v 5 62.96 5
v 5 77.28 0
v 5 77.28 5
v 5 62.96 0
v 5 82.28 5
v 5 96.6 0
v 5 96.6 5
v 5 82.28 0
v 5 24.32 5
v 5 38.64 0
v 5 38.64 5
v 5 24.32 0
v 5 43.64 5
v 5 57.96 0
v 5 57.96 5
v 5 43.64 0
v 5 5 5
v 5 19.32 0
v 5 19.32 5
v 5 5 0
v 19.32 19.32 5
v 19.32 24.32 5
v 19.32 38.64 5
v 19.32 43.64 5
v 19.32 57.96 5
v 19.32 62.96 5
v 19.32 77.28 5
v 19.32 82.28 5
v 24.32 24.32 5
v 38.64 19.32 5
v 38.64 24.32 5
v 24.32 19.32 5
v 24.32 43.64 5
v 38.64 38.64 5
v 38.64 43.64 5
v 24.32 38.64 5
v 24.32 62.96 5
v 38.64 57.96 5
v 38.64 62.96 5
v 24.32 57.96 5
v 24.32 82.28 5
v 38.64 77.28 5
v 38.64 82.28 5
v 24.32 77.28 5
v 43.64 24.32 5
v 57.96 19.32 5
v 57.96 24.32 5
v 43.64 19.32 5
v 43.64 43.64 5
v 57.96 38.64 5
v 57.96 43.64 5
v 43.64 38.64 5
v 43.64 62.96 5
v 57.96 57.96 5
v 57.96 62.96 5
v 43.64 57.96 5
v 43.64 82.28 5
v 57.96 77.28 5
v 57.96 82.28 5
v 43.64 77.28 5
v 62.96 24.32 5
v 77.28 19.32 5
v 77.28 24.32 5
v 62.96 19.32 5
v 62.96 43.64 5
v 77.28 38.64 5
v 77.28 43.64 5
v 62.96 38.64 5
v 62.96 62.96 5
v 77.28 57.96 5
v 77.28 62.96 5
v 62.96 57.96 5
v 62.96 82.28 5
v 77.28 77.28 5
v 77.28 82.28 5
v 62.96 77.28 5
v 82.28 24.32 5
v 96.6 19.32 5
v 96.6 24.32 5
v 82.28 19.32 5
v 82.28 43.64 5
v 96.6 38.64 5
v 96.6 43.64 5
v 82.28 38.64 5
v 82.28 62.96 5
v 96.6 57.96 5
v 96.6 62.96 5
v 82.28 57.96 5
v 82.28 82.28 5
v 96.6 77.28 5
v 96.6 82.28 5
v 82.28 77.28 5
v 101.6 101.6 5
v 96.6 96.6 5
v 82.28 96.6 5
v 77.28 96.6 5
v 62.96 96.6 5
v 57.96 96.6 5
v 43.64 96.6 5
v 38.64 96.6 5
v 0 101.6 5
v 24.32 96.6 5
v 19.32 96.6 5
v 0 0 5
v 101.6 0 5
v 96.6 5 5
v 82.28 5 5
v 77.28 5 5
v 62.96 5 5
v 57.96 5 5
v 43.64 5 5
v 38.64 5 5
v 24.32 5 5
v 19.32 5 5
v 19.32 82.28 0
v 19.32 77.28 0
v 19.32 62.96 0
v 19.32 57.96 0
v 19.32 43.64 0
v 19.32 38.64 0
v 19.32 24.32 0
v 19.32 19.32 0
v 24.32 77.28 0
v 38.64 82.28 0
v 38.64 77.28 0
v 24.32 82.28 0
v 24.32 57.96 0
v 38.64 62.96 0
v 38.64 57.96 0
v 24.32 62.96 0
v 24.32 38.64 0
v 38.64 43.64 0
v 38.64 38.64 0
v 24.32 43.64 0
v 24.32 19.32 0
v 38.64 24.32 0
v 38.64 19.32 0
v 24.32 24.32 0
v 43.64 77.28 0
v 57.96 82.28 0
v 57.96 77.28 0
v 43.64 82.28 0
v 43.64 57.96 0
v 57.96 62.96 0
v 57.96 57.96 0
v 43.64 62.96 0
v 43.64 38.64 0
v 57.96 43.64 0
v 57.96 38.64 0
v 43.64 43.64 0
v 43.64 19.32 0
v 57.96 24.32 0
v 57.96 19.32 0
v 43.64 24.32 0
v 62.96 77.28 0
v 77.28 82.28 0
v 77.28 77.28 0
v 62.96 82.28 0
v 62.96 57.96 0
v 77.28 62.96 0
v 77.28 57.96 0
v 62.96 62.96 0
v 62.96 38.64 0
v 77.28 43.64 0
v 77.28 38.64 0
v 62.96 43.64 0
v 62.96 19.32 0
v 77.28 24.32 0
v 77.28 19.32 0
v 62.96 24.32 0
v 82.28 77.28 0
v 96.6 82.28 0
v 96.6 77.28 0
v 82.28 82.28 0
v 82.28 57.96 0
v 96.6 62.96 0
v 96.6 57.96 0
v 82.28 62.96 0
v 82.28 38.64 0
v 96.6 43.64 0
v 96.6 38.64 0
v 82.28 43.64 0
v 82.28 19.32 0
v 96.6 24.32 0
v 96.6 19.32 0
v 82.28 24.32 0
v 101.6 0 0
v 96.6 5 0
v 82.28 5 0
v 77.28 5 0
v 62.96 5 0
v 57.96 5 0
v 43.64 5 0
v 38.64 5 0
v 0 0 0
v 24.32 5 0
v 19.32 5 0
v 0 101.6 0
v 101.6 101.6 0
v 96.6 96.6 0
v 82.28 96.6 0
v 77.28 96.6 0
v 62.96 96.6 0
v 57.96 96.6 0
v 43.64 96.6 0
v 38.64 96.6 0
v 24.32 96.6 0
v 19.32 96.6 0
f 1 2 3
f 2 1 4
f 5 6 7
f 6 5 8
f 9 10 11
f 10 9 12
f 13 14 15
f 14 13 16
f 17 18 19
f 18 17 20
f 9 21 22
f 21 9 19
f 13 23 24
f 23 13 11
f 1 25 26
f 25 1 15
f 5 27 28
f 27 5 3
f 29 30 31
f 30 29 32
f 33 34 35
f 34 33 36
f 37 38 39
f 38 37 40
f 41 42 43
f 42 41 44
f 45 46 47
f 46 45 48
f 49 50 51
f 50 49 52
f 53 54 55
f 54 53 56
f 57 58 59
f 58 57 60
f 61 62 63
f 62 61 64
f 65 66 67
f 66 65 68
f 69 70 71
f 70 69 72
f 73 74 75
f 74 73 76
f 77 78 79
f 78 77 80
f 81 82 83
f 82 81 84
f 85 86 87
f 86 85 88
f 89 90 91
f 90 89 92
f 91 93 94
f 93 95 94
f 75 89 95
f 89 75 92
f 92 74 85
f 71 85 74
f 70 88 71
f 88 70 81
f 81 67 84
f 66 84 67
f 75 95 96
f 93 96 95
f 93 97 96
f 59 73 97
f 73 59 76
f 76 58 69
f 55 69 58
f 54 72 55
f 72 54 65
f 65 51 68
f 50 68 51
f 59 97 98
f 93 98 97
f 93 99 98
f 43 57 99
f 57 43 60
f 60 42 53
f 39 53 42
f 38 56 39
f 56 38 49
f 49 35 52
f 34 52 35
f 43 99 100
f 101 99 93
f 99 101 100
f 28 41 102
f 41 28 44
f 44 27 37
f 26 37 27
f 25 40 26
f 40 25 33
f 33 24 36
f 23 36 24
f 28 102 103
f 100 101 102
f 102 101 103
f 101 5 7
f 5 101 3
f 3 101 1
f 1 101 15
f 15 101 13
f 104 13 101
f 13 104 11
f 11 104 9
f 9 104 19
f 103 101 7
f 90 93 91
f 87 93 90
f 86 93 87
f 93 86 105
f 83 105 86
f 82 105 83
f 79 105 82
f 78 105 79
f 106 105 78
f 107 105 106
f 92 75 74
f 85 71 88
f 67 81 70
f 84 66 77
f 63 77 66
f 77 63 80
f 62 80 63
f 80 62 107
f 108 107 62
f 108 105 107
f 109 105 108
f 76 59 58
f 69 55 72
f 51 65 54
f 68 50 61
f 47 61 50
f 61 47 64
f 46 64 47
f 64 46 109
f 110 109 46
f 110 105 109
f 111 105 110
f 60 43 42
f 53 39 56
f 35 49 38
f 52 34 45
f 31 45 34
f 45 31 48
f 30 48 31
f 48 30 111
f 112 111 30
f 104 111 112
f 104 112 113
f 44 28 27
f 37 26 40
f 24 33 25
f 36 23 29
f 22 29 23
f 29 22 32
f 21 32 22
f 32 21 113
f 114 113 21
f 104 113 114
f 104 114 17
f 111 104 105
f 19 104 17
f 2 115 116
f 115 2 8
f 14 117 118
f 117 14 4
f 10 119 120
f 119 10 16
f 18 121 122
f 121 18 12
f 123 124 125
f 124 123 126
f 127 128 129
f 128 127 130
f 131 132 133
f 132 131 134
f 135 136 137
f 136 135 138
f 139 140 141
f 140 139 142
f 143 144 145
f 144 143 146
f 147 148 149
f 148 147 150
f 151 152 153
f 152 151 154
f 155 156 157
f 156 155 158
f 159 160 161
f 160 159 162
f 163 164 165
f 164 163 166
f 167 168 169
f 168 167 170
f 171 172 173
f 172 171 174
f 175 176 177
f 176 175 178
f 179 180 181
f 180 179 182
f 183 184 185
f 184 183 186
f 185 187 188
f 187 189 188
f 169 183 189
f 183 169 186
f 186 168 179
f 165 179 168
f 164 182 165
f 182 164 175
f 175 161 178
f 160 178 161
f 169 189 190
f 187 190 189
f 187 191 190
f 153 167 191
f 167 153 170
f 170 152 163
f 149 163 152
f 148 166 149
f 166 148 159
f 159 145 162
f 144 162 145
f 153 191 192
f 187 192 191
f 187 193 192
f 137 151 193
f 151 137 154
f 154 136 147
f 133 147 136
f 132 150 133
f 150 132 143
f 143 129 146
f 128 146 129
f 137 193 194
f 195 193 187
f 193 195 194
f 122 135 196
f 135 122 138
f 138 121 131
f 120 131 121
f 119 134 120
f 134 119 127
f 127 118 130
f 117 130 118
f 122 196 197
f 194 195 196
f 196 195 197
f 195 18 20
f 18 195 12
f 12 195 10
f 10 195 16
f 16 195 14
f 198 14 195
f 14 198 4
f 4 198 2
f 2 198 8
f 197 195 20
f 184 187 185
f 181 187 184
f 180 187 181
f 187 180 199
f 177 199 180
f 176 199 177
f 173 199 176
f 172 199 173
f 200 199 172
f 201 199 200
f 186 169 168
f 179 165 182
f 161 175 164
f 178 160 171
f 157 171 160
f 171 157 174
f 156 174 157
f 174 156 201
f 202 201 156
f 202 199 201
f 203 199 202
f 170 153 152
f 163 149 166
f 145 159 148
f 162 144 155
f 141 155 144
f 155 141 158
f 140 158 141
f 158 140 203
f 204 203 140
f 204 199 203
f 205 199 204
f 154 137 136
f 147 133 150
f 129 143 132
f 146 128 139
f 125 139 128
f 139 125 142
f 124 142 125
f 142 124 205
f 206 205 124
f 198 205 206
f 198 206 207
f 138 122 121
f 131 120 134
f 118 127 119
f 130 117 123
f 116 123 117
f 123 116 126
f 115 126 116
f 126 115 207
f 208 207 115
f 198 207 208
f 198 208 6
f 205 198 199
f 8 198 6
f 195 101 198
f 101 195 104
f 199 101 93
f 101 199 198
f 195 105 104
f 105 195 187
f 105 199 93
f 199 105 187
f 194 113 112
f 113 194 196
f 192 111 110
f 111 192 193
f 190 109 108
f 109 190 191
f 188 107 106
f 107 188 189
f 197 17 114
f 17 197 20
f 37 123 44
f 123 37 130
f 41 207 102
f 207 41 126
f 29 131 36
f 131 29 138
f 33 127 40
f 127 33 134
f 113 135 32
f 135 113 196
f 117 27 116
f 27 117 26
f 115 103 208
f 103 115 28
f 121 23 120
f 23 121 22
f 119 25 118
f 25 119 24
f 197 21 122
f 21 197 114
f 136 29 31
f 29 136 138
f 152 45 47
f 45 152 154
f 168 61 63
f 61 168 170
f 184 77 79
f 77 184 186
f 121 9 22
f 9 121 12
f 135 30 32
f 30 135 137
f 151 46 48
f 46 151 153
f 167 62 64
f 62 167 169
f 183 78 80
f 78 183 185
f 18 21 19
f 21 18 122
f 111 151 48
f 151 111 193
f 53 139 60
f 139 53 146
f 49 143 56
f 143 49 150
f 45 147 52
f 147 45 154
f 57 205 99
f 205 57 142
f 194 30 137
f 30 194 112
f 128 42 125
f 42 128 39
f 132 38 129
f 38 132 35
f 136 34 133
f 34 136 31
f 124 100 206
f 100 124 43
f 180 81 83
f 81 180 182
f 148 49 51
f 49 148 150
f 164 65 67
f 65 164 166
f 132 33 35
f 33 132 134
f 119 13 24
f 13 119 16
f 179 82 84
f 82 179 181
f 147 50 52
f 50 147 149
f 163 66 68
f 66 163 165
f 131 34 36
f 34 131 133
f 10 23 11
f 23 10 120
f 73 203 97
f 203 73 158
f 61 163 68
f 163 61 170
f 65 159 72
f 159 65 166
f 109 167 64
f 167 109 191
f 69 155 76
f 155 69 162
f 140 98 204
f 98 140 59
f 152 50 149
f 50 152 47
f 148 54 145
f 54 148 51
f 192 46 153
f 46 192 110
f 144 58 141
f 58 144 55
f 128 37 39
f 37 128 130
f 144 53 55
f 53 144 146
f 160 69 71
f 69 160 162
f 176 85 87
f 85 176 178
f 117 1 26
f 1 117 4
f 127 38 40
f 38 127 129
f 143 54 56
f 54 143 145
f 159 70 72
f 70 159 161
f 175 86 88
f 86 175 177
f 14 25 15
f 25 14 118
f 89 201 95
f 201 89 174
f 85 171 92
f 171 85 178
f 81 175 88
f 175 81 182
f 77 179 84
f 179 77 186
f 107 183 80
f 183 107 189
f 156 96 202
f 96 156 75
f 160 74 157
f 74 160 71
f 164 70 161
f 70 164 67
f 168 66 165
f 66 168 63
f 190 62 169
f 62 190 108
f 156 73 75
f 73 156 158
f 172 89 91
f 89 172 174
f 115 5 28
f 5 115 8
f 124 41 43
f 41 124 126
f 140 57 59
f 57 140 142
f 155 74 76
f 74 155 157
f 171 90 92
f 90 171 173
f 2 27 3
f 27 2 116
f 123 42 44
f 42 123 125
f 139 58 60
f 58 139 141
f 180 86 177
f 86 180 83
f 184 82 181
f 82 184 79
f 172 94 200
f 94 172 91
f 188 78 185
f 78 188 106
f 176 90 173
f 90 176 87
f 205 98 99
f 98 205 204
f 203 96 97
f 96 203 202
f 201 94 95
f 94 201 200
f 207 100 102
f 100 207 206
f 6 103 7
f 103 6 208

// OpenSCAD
// Setup
$fn = 100;
$fa = 1;
$fs = 0.4;

// Phone dimensions per apple
size   = 4 * 25.4; // 4 inches
thick  = 5.0;
count  = 5.0;

// Calcs
last = size - thick;
inc  = last / count;
echo(inc-thick);

// render
for(i = [0:inc:last]) {
    translate([i,0,0]) cube([thick, size, thick], false);
    translate([0,i,0]) cube([size, thick, thick], false);
}
